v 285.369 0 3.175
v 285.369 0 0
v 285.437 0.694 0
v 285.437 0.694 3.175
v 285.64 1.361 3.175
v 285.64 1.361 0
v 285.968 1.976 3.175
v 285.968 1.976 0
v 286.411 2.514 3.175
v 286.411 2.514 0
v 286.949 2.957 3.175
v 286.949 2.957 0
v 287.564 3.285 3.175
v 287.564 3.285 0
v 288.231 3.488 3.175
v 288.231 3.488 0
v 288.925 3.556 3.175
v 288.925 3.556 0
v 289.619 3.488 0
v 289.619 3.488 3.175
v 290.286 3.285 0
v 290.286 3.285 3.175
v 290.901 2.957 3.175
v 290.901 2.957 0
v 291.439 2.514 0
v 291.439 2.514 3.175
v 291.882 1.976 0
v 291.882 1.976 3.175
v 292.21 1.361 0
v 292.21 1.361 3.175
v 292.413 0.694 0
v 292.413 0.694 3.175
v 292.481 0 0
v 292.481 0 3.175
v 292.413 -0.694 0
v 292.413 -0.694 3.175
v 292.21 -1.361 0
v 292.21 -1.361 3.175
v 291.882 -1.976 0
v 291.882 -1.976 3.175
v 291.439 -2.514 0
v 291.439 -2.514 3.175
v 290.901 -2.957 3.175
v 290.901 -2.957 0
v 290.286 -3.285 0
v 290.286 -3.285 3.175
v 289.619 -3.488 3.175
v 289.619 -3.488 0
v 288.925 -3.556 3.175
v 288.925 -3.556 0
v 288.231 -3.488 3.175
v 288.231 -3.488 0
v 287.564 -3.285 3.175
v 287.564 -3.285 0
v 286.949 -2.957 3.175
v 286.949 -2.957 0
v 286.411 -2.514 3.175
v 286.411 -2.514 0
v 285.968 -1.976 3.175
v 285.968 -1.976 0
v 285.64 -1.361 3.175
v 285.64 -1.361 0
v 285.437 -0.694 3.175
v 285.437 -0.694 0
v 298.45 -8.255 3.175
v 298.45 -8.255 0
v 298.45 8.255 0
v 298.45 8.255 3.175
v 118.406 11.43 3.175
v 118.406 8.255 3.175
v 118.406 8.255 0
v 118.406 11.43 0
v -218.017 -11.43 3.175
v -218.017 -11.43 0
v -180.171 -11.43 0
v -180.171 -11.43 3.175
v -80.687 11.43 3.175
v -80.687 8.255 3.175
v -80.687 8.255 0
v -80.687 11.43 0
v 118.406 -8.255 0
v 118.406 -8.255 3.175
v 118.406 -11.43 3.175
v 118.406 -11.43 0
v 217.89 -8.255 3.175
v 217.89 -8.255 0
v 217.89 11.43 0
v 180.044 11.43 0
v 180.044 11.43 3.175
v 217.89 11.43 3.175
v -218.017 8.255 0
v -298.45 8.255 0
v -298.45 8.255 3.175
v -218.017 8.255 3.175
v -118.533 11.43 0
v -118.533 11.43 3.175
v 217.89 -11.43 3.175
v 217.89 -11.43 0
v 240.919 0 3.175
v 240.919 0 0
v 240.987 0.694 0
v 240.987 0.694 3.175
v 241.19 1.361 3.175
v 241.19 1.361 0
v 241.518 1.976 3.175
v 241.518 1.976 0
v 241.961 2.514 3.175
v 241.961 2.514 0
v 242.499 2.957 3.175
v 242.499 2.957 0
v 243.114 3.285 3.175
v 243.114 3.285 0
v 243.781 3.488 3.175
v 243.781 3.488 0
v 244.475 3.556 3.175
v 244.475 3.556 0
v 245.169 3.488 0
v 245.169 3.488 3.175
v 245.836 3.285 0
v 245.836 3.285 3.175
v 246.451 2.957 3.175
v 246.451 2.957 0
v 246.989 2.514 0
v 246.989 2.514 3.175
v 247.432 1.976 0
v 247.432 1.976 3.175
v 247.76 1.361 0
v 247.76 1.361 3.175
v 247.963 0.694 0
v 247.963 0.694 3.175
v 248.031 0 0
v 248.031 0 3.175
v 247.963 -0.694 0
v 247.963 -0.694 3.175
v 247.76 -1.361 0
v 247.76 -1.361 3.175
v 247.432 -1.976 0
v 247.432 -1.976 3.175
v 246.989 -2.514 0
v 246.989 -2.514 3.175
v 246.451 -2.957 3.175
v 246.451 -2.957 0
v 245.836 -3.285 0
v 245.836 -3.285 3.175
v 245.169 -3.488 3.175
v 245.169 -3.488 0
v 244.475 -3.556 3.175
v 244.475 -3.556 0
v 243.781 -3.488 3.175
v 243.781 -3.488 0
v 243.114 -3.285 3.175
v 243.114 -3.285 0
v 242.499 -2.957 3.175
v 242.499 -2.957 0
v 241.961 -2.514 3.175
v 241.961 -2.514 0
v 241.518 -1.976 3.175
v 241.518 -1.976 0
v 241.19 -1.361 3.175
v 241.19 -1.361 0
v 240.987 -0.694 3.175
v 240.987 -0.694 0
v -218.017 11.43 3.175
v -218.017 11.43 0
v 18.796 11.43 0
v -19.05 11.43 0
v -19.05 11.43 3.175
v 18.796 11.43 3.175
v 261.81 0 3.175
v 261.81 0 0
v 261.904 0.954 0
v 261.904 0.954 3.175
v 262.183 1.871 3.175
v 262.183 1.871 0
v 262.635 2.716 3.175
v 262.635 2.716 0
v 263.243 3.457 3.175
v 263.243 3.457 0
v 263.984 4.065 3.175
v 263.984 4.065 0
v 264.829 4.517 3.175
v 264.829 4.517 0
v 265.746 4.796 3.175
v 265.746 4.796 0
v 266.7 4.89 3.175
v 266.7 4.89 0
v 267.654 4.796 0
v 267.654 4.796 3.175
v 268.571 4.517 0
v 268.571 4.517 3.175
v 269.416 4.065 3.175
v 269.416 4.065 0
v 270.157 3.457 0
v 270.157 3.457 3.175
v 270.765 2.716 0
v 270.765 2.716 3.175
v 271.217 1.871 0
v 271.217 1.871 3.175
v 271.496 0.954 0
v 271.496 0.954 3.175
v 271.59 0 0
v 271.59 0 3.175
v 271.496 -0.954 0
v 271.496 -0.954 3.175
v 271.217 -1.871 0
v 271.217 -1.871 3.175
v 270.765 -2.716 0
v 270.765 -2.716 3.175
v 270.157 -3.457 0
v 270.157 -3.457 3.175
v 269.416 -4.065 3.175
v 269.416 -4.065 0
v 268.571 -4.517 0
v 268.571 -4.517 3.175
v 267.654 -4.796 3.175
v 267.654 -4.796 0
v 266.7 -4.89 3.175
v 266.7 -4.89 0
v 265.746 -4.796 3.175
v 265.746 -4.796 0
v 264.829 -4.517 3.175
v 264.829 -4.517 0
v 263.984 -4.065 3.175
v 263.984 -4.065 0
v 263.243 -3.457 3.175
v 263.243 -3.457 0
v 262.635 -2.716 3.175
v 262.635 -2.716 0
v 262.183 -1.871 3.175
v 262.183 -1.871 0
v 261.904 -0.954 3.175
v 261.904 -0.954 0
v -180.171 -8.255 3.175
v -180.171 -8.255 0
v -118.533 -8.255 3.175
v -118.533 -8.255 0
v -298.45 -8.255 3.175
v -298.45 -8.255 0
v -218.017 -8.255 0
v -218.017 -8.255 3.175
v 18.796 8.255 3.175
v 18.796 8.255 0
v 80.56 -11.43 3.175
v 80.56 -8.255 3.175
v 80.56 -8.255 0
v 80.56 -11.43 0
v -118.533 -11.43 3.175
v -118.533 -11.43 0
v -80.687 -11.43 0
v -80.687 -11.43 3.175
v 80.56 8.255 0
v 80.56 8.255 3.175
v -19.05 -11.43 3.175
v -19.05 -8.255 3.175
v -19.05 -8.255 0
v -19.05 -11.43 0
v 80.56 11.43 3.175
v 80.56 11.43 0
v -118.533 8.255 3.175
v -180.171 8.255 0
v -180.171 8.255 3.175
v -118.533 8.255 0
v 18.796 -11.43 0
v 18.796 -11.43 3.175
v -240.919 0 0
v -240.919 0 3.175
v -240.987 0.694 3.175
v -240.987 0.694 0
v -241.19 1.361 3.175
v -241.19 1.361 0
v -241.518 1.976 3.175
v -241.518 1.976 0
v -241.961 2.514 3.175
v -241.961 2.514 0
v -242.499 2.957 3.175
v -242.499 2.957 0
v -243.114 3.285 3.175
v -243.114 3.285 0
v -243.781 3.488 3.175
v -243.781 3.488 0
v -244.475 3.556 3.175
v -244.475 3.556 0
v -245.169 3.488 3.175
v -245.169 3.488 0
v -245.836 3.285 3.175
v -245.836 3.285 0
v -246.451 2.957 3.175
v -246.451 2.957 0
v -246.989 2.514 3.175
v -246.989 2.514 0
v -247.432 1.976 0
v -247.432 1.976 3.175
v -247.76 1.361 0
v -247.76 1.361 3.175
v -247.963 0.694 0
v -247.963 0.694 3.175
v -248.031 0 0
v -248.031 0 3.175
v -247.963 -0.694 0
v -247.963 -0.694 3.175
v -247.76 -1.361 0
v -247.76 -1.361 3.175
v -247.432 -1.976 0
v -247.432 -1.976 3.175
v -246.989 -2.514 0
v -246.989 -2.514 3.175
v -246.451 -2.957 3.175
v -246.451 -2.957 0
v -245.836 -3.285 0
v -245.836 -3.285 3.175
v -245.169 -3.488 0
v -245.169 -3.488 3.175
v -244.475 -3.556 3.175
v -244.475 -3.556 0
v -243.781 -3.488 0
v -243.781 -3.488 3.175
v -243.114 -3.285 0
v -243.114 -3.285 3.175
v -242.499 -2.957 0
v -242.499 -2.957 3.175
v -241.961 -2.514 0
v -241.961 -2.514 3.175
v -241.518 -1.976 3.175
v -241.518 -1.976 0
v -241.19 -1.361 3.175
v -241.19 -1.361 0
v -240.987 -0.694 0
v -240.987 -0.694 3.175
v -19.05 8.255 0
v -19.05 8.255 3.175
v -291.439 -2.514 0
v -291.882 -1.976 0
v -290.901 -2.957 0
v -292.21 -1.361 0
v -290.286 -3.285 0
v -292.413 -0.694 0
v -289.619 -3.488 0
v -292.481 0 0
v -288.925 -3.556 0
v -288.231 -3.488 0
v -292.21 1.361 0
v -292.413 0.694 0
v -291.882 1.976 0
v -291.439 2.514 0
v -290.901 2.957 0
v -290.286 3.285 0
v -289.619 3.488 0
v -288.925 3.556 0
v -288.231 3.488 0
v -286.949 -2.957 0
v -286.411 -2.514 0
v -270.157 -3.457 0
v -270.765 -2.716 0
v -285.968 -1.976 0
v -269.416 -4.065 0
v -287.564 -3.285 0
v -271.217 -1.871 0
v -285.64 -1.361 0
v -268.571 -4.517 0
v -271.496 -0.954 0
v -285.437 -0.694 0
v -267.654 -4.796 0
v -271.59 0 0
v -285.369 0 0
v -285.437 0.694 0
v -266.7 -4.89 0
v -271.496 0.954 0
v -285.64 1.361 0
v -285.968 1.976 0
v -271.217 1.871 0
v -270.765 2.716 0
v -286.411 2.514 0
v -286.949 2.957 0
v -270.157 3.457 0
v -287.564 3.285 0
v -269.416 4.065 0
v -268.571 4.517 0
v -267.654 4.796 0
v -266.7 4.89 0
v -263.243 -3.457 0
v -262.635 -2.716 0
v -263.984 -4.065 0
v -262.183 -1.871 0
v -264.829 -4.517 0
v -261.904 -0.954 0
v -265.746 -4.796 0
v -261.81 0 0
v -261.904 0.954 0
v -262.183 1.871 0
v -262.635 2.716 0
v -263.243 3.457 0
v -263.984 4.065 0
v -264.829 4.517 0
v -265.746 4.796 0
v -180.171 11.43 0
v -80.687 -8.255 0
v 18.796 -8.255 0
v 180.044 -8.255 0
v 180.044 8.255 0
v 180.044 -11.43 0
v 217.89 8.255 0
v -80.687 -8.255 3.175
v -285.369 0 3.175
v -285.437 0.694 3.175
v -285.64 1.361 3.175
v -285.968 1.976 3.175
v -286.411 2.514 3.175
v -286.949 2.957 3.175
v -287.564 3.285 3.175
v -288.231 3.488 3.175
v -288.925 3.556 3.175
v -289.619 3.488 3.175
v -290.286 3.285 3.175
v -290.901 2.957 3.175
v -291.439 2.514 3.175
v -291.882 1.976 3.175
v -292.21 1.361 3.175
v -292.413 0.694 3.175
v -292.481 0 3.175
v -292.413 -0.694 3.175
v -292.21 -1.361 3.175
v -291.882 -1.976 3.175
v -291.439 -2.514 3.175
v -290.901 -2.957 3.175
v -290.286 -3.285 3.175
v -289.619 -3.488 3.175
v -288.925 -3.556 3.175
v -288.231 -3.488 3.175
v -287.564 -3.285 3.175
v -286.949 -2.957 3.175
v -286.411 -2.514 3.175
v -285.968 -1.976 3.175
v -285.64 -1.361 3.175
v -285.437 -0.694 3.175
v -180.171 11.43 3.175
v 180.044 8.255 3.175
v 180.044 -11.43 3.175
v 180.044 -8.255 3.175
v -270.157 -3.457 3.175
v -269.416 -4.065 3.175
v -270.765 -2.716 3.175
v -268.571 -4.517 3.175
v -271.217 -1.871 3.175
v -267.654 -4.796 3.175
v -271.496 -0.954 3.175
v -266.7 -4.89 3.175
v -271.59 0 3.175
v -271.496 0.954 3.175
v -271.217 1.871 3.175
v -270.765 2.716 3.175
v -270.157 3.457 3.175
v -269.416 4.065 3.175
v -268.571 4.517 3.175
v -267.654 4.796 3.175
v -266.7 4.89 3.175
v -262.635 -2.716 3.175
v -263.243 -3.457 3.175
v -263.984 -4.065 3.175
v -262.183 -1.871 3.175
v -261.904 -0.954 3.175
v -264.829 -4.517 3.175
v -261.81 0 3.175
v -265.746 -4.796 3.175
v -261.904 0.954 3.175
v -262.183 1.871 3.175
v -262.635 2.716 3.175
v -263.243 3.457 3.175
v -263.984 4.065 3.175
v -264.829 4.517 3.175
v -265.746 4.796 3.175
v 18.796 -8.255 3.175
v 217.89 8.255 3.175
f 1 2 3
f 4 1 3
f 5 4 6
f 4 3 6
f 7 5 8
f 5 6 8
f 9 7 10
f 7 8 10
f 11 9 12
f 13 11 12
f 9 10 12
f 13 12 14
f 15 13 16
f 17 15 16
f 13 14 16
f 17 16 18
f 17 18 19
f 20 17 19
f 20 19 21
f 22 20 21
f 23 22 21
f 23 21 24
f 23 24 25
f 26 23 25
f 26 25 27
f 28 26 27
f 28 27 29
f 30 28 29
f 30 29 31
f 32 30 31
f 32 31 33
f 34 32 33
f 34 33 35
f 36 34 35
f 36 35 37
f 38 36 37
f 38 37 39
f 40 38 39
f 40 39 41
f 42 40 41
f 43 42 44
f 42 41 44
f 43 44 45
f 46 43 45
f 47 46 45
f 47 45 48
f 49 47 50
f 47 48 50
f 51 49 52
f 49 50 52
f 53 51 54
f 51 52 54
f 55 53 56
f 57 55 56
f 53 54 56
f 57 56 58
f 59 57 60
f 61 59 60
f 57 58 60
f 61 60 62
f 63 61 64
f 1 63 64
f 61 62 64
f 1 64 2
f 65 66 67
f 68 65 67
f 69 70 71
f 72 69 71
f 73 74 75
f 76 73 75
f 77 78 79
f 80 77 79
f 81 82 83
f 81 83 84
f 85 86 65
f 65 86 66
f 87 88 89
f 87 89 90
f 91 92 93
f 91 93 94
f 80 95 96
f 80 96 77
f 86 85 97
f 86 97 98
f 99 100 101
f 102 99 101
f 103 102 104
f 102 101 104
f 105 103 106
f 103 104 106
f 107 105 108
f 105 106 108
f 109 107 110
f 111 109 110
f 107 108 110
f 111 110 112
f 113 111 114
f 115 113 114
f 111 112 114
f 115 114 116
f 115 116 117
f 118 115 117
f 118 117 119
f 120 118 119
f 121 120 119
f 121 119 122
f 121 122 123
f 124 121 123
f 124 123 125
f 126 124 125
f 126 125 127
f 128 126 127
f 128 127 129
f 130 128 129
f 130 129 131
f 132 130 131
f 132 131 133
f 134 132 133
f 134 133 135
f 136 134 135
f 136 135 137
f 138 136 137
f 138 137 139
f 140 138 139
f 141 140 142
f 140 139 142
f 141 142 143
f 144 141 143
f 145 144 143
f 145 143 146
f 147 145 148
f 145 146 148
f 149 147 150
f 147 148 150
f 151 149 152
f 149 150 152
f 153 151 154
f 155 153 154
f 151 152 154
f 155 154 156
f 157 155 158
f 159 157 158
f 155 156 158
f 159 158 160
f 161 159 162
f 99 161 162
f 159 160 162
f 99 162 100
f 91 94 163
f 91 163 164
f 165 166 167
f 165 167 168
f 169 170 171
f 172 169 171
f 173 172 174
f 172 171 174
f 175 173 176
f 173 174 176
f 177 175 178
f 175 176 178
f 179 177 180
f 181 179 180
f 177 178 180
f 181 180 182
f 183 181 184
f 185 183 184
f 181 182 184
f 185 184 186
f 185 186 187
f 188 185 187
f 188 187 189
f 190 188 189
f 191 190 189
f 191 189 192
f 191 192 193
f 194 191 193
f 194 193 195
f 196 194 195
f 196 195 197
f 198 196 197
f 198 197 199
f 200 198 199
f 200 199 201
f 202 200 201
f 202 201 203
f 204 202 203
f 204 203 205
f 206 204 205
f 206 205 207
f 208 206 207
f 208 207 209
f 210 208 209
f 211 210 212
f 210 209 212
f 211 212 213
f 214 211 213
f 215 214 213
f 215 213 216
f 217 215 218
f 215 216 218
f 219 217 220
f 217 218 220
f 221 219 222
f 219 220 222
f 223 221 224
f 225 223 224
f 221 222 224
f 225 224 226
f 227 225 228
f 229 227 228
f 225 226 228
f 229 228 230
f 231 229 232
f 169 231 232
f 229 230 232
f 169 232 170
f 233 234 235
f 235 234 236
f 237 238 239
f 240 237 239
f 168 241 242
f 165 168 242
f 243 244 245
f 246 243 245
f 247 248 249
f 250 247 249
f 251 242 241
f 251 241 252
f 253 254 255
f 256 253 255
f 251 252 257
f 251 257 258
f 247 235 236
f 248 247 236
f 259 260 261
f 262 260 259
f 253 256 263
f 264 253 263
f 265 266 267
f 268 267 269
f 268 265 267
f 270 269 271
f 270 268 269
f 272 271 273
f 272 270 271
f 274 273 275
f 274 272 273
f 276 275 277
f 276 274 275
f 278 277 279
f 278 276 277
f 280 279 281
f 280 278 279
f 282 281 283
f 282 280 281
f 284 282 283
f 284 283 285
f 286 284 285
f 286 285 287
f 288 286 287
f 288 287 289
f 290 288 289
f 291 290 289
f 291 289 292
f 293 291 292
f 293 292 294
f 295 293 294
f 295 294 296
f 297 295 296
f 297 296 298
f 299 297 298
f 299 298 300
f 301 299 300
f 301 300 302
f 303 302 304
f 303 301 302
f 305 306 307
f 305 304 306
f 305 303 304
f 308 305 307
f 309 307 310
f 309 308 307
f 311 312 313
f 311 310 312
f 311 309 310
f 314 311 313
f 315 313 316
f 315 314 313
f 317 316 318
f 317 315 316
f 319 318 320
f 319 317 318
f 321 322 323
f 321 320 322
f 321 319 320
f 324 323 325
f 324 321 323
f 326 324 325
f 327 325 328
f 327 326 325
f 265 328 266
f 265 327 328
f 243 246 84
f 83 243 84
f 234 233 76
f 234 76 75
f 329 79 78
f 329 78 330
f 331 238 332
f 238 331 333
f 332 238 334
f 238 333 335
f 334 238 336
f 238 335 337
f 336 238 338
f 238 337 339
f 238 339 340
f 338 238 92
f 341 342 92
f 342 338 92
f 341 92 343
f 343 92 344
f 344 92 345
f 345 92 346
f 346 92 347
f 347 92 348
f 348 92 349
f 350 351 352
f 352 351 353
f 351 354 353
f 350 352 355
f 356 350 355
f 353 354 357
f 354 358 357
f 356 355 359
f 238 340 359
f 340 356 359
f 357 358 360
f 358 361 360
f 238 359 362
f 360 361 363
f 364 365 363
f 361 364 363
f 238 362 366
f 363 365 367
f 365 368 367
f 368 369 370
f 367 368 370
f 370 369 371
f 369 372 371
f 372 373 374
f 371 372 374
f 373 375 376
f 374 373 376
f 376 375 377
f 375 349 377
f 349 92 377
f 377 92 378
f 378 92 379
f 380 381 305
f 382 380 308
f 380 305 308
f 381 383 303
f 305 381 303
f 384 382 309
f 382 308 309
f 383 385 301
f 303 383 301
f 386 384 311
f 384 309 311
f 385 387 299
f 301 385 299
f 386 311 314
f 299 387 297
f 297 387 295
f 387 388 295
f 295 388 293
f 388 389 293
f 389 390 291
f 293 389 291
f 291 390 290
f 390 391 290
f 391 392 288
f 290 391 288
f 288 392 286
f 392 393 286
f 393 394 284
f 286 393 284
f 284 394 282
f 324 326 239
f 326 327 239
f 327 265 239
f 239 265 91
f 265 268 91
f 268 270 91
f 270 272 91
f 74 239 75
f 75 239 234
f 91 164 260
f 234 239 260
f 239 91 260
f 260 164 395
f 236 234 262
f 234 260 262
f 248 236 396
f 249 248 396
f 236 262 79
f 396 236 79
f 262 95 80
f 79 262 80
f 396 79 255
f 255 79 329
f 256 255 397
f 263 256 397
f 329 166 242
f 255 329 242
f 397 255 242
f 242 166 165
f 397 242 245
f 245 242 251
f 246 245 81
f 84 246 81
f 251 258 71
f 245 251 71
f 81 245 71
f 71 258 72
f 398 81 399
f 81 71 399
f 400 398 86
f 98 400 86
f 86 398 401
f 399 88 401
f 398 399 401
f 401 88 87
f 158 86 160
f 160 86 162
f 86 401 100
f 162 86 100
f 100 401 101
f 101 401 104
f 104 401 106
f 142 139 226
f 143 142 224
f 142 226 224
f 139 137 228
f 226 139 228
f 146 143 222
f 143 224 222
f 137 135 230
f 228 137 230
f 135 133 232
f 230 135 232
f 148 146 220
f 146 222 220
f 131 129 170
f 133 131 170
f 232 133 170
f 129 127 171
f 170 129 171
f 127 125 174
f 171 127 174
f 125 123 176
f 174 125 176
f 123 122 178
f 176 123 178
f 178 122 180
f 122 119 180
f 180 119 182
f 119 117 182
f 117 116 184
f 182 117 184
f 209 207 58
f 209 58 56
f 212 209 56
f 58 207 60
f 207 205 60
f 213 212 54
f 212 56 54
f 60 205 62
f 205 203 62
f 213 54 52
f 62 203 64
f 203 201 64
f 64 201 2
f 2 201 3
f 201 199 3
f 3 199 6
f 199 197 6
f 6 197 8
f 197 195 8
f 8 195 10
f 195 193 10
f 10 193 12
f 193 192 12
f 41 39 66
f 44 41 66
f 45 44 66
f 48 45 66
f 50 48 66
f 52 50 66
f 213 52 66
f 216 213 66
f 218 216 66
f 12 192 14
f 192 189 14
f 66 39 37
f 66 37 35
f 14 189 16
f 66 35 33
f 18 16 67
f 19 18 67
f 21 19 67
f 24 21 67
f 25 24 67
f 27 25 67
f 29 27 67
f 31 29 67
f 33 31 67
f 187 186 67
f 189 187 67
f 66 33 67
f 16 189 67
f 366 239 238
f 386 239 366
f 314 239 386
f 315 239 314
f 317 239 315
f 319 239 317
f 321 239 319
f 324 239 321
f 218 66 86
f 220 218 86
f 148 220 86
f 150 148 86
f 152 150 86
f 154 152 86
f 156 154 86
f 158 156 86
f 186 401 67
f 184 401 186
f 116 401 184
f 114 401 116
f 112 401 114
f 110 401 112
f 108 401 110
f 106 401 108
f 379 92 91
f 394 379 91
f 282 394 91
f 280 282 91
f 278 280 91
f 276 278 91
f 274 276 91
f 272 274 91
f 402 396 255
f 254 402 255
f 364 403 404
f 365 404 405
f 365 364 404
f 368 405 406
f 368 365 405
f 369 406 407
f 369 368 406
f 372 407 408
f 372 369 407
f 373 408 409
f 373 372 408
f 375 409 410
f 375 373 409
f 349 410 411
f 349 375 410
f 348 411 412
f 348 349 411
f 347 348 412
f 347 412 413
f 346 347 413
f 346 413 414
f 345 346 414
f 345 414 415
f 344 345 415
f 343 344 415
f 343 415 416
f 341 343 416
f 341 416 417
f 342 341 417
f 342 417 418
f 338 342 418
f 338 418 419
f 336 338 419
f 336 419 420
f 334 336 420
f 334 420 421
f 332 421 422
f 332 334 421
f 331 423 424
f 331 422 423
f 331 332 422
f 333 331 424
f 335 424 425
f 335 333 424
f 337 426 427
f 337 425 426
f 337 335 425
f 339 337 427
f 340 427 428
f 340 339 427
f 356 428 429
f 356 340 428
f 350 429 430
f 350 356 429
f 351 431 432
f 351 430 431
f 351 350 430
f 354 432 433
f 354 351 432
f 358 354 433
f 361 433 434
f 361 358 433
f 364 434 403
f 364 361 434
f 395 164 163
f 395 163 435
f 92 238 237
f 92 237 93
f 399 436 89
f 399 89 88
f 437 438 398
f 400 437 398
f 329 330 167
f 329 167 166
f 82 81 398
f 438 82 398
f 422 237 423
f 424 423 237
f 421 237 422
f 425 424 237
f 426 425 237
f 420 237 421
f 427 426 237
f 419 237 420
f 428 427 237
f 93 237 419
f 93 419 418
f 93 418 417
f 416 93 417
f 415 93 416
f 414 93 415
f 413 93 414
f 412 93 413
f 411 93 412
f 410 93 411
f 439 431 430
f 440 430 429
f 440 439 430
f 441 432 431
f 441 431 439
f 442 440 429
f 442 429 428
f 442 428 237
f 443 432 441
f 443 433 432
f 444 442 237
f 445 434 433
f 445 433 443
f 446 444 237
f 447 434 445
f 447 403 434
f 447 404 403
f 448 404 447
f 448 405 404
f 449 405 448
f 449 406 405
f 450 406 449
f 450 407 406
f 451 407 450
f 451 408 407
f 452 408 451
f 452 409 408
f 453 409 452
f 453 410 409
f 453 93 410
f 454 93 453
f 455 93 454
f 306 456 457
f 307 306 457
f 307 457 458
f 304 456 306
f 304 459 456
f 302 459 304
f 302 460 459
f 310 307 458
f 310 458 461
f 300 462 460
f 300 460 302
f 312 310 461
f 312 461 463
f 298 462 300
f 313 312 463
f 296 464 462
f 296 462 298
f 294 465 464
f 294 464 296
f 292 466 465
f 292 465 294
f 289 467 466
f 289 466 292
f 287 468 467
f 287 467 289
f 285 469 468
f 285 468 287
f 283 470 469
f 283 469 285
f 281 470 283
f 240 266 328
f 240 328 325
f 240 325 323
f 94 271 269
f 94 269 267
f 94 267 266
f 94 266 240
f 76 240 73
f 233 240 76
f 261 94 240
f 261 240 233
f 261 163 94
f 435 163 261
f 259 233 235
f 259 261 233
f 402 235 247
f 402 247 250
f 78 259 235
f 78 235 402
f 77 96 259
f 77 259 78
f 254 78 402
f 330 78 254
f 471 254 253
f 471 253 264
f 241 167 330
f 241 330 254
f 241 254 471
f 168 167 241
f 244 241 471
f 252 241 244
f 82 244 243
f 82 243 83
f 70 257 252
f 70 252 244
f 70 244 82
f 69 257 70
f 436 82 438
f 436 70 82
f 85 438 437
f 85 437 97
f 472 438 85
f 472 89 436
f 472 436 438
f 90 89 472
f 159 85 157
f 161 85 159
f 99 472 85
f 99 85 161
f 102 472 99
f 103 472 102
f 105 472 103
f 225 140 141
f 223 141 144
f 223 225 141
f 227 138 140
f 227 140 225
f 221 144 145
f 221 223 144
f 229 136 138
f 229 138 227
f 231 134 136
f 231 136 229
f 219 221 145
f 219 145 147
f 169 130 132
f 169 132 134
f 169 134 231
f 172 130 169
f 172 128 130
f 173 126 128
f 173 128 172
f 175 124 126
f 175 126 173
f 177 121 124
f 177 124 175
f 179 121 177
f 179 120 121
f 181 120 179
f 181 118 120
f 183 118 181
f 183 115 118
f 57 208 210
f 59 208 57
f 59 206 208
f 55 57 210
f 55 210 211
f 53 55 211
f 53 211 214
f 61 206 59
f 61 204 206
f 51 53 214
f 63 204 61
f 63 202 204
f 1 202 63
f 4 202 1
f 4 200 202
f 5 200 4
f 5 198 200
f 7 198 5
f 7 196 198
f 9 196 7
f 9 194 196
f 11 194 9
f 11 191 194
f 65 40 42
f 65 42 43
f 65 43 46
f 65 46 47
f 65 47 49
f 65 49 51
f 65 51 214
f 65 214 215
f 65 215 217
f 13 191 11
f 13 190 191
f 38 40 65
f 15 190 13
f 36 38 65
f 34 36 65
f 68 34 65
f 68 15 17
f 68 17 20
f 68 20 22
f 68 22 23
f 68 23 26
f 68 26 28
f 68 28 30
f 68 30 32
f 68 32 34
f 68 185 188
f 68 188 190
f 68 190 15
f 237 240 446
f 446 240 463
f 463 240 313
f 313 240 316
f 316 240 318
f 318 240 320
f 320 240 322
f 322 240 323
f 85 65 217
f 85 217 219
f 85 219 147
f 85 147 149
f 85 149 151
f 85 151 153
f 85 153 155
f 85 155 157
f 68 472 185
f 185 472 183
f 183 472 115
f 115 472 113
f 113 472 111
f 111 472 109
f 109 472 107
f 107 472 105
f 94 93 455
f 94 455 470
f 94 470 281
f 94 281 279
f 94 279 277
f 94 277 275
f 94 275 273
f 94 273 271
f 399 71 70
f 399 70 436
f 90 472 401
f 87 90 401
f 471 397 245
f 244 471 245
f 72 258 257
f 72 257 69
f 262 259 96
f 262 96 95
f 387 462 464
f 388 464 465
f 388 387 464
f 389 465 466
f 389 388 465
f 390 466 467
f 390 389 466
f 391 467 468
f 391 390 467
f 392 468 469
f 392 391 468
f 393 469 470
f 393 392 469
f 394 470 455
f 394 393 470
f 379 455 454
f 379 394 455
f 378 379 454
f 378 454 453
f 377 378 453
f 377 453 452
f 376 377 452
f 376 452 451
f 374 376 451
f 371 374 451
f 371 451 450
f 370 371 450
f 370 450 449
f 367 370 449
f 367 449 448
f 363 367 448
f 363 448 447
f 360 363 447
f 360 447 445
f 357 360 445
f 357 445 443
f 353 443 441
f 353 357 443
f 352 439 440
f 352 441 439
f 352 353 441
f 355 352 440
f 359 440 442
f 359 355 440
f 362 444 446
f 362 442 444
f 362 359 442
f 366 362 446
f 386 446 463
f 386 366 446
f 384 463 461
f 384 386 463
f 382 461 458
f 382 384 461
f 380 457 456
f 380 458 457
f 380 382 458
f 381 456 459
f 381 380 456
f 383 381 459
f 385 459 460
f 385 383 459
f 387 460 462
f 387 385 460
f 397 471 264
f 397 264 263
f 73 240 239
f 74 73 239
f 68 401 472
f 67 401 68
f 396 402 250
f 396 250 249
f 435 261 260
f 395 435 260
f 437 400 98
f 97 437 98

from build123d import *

# Parameters (mm, degrees)
SKETCH1_W           = 596.9
SKETCH1_H           = 16.51
BOSS_EXTRUDE1_DEPTH = 3.175
SKETCH3_W           = 37.846
SKETCH3_H           = 3.175
BOSS_EXTRUDE2_DEPTH = 3.175
SKETCH4_R           = 3.556
SKETCH4_R_2         = 4.8895
CUT_EXTRUDE1_DEPTH  = 299.685667592


with BuildPart() as part:
    # Sketch1 → Boss-Extrude1 (new body)
    with BuildSketch(Plane.XY):
        Rectangle(SKETCH1_W, SKETCH1_H)
    extrude(amount=BOSS_EXTRUDE1_DEPTH)

    # Sketch3 → Boss-Extrude2 (add)
    with BuildSketch(Plane(origin=(0, 8.255, 0), x_dir=(1, 0, 0), z_dir=(0, 1, 0))):
        with Locations((-199.093666667, -1.5875)):
            Rectangle(SKETCH3_W, SKETCH3_H)
        with Locations((-99.610333333, -1.5875)):
            Rectangle(SKETCH3_W, SKETCH3_H)
        with Locations((-0.127, -1.5875)):
            Rectangle(SKETCH3_W, SKETCH3_H)
        with Locations((99.483333333, -1.5875)):
            Rectangle(SKETCH3_W, SKETCH3_H)
        with Locations((198.966666751, -1.5875)):
            Rectangle(SKETCH3_W, SKETCH3_H)
    boss_extrude2 = extrude(amount=BOSS_EXTRUDE2_DEPTH)

    # Mirror1: Boss-Extrude2 across plane
    add(boss_extrude2.mirror(Plane.ZX))

    # Sketch4 → Cut-Extrude1 (cut, through all)
    with BuildSketch(Plane(origin=(0, 0, 0), x_dir=(-1, 0, 0), z_dir=(0, 0, -1))):
        with Locations((-288.925, 0)):
            Circle(SKETCH4_R)
        with Locations((-244.475, 0)):
            Circle(SKETCH4_R)
        with Locations((-266.7, 0)):
            Circle(SKETCH4_R_2)
    cut_extrude1 = extrude(amount=-CUT_EXTRUDE1_DEPTH, mode=Mode.SUBTRACT)

    # Mirror2: Cut-Extrude1 across plane
    add(cut_extrude1.mirror(Plane(origin=(0, 0, 0), x_dir=(0, 0, 1), z_dir=(1, 0, 0))), mode=Mode.SUBTRACT)


solid = part.part
